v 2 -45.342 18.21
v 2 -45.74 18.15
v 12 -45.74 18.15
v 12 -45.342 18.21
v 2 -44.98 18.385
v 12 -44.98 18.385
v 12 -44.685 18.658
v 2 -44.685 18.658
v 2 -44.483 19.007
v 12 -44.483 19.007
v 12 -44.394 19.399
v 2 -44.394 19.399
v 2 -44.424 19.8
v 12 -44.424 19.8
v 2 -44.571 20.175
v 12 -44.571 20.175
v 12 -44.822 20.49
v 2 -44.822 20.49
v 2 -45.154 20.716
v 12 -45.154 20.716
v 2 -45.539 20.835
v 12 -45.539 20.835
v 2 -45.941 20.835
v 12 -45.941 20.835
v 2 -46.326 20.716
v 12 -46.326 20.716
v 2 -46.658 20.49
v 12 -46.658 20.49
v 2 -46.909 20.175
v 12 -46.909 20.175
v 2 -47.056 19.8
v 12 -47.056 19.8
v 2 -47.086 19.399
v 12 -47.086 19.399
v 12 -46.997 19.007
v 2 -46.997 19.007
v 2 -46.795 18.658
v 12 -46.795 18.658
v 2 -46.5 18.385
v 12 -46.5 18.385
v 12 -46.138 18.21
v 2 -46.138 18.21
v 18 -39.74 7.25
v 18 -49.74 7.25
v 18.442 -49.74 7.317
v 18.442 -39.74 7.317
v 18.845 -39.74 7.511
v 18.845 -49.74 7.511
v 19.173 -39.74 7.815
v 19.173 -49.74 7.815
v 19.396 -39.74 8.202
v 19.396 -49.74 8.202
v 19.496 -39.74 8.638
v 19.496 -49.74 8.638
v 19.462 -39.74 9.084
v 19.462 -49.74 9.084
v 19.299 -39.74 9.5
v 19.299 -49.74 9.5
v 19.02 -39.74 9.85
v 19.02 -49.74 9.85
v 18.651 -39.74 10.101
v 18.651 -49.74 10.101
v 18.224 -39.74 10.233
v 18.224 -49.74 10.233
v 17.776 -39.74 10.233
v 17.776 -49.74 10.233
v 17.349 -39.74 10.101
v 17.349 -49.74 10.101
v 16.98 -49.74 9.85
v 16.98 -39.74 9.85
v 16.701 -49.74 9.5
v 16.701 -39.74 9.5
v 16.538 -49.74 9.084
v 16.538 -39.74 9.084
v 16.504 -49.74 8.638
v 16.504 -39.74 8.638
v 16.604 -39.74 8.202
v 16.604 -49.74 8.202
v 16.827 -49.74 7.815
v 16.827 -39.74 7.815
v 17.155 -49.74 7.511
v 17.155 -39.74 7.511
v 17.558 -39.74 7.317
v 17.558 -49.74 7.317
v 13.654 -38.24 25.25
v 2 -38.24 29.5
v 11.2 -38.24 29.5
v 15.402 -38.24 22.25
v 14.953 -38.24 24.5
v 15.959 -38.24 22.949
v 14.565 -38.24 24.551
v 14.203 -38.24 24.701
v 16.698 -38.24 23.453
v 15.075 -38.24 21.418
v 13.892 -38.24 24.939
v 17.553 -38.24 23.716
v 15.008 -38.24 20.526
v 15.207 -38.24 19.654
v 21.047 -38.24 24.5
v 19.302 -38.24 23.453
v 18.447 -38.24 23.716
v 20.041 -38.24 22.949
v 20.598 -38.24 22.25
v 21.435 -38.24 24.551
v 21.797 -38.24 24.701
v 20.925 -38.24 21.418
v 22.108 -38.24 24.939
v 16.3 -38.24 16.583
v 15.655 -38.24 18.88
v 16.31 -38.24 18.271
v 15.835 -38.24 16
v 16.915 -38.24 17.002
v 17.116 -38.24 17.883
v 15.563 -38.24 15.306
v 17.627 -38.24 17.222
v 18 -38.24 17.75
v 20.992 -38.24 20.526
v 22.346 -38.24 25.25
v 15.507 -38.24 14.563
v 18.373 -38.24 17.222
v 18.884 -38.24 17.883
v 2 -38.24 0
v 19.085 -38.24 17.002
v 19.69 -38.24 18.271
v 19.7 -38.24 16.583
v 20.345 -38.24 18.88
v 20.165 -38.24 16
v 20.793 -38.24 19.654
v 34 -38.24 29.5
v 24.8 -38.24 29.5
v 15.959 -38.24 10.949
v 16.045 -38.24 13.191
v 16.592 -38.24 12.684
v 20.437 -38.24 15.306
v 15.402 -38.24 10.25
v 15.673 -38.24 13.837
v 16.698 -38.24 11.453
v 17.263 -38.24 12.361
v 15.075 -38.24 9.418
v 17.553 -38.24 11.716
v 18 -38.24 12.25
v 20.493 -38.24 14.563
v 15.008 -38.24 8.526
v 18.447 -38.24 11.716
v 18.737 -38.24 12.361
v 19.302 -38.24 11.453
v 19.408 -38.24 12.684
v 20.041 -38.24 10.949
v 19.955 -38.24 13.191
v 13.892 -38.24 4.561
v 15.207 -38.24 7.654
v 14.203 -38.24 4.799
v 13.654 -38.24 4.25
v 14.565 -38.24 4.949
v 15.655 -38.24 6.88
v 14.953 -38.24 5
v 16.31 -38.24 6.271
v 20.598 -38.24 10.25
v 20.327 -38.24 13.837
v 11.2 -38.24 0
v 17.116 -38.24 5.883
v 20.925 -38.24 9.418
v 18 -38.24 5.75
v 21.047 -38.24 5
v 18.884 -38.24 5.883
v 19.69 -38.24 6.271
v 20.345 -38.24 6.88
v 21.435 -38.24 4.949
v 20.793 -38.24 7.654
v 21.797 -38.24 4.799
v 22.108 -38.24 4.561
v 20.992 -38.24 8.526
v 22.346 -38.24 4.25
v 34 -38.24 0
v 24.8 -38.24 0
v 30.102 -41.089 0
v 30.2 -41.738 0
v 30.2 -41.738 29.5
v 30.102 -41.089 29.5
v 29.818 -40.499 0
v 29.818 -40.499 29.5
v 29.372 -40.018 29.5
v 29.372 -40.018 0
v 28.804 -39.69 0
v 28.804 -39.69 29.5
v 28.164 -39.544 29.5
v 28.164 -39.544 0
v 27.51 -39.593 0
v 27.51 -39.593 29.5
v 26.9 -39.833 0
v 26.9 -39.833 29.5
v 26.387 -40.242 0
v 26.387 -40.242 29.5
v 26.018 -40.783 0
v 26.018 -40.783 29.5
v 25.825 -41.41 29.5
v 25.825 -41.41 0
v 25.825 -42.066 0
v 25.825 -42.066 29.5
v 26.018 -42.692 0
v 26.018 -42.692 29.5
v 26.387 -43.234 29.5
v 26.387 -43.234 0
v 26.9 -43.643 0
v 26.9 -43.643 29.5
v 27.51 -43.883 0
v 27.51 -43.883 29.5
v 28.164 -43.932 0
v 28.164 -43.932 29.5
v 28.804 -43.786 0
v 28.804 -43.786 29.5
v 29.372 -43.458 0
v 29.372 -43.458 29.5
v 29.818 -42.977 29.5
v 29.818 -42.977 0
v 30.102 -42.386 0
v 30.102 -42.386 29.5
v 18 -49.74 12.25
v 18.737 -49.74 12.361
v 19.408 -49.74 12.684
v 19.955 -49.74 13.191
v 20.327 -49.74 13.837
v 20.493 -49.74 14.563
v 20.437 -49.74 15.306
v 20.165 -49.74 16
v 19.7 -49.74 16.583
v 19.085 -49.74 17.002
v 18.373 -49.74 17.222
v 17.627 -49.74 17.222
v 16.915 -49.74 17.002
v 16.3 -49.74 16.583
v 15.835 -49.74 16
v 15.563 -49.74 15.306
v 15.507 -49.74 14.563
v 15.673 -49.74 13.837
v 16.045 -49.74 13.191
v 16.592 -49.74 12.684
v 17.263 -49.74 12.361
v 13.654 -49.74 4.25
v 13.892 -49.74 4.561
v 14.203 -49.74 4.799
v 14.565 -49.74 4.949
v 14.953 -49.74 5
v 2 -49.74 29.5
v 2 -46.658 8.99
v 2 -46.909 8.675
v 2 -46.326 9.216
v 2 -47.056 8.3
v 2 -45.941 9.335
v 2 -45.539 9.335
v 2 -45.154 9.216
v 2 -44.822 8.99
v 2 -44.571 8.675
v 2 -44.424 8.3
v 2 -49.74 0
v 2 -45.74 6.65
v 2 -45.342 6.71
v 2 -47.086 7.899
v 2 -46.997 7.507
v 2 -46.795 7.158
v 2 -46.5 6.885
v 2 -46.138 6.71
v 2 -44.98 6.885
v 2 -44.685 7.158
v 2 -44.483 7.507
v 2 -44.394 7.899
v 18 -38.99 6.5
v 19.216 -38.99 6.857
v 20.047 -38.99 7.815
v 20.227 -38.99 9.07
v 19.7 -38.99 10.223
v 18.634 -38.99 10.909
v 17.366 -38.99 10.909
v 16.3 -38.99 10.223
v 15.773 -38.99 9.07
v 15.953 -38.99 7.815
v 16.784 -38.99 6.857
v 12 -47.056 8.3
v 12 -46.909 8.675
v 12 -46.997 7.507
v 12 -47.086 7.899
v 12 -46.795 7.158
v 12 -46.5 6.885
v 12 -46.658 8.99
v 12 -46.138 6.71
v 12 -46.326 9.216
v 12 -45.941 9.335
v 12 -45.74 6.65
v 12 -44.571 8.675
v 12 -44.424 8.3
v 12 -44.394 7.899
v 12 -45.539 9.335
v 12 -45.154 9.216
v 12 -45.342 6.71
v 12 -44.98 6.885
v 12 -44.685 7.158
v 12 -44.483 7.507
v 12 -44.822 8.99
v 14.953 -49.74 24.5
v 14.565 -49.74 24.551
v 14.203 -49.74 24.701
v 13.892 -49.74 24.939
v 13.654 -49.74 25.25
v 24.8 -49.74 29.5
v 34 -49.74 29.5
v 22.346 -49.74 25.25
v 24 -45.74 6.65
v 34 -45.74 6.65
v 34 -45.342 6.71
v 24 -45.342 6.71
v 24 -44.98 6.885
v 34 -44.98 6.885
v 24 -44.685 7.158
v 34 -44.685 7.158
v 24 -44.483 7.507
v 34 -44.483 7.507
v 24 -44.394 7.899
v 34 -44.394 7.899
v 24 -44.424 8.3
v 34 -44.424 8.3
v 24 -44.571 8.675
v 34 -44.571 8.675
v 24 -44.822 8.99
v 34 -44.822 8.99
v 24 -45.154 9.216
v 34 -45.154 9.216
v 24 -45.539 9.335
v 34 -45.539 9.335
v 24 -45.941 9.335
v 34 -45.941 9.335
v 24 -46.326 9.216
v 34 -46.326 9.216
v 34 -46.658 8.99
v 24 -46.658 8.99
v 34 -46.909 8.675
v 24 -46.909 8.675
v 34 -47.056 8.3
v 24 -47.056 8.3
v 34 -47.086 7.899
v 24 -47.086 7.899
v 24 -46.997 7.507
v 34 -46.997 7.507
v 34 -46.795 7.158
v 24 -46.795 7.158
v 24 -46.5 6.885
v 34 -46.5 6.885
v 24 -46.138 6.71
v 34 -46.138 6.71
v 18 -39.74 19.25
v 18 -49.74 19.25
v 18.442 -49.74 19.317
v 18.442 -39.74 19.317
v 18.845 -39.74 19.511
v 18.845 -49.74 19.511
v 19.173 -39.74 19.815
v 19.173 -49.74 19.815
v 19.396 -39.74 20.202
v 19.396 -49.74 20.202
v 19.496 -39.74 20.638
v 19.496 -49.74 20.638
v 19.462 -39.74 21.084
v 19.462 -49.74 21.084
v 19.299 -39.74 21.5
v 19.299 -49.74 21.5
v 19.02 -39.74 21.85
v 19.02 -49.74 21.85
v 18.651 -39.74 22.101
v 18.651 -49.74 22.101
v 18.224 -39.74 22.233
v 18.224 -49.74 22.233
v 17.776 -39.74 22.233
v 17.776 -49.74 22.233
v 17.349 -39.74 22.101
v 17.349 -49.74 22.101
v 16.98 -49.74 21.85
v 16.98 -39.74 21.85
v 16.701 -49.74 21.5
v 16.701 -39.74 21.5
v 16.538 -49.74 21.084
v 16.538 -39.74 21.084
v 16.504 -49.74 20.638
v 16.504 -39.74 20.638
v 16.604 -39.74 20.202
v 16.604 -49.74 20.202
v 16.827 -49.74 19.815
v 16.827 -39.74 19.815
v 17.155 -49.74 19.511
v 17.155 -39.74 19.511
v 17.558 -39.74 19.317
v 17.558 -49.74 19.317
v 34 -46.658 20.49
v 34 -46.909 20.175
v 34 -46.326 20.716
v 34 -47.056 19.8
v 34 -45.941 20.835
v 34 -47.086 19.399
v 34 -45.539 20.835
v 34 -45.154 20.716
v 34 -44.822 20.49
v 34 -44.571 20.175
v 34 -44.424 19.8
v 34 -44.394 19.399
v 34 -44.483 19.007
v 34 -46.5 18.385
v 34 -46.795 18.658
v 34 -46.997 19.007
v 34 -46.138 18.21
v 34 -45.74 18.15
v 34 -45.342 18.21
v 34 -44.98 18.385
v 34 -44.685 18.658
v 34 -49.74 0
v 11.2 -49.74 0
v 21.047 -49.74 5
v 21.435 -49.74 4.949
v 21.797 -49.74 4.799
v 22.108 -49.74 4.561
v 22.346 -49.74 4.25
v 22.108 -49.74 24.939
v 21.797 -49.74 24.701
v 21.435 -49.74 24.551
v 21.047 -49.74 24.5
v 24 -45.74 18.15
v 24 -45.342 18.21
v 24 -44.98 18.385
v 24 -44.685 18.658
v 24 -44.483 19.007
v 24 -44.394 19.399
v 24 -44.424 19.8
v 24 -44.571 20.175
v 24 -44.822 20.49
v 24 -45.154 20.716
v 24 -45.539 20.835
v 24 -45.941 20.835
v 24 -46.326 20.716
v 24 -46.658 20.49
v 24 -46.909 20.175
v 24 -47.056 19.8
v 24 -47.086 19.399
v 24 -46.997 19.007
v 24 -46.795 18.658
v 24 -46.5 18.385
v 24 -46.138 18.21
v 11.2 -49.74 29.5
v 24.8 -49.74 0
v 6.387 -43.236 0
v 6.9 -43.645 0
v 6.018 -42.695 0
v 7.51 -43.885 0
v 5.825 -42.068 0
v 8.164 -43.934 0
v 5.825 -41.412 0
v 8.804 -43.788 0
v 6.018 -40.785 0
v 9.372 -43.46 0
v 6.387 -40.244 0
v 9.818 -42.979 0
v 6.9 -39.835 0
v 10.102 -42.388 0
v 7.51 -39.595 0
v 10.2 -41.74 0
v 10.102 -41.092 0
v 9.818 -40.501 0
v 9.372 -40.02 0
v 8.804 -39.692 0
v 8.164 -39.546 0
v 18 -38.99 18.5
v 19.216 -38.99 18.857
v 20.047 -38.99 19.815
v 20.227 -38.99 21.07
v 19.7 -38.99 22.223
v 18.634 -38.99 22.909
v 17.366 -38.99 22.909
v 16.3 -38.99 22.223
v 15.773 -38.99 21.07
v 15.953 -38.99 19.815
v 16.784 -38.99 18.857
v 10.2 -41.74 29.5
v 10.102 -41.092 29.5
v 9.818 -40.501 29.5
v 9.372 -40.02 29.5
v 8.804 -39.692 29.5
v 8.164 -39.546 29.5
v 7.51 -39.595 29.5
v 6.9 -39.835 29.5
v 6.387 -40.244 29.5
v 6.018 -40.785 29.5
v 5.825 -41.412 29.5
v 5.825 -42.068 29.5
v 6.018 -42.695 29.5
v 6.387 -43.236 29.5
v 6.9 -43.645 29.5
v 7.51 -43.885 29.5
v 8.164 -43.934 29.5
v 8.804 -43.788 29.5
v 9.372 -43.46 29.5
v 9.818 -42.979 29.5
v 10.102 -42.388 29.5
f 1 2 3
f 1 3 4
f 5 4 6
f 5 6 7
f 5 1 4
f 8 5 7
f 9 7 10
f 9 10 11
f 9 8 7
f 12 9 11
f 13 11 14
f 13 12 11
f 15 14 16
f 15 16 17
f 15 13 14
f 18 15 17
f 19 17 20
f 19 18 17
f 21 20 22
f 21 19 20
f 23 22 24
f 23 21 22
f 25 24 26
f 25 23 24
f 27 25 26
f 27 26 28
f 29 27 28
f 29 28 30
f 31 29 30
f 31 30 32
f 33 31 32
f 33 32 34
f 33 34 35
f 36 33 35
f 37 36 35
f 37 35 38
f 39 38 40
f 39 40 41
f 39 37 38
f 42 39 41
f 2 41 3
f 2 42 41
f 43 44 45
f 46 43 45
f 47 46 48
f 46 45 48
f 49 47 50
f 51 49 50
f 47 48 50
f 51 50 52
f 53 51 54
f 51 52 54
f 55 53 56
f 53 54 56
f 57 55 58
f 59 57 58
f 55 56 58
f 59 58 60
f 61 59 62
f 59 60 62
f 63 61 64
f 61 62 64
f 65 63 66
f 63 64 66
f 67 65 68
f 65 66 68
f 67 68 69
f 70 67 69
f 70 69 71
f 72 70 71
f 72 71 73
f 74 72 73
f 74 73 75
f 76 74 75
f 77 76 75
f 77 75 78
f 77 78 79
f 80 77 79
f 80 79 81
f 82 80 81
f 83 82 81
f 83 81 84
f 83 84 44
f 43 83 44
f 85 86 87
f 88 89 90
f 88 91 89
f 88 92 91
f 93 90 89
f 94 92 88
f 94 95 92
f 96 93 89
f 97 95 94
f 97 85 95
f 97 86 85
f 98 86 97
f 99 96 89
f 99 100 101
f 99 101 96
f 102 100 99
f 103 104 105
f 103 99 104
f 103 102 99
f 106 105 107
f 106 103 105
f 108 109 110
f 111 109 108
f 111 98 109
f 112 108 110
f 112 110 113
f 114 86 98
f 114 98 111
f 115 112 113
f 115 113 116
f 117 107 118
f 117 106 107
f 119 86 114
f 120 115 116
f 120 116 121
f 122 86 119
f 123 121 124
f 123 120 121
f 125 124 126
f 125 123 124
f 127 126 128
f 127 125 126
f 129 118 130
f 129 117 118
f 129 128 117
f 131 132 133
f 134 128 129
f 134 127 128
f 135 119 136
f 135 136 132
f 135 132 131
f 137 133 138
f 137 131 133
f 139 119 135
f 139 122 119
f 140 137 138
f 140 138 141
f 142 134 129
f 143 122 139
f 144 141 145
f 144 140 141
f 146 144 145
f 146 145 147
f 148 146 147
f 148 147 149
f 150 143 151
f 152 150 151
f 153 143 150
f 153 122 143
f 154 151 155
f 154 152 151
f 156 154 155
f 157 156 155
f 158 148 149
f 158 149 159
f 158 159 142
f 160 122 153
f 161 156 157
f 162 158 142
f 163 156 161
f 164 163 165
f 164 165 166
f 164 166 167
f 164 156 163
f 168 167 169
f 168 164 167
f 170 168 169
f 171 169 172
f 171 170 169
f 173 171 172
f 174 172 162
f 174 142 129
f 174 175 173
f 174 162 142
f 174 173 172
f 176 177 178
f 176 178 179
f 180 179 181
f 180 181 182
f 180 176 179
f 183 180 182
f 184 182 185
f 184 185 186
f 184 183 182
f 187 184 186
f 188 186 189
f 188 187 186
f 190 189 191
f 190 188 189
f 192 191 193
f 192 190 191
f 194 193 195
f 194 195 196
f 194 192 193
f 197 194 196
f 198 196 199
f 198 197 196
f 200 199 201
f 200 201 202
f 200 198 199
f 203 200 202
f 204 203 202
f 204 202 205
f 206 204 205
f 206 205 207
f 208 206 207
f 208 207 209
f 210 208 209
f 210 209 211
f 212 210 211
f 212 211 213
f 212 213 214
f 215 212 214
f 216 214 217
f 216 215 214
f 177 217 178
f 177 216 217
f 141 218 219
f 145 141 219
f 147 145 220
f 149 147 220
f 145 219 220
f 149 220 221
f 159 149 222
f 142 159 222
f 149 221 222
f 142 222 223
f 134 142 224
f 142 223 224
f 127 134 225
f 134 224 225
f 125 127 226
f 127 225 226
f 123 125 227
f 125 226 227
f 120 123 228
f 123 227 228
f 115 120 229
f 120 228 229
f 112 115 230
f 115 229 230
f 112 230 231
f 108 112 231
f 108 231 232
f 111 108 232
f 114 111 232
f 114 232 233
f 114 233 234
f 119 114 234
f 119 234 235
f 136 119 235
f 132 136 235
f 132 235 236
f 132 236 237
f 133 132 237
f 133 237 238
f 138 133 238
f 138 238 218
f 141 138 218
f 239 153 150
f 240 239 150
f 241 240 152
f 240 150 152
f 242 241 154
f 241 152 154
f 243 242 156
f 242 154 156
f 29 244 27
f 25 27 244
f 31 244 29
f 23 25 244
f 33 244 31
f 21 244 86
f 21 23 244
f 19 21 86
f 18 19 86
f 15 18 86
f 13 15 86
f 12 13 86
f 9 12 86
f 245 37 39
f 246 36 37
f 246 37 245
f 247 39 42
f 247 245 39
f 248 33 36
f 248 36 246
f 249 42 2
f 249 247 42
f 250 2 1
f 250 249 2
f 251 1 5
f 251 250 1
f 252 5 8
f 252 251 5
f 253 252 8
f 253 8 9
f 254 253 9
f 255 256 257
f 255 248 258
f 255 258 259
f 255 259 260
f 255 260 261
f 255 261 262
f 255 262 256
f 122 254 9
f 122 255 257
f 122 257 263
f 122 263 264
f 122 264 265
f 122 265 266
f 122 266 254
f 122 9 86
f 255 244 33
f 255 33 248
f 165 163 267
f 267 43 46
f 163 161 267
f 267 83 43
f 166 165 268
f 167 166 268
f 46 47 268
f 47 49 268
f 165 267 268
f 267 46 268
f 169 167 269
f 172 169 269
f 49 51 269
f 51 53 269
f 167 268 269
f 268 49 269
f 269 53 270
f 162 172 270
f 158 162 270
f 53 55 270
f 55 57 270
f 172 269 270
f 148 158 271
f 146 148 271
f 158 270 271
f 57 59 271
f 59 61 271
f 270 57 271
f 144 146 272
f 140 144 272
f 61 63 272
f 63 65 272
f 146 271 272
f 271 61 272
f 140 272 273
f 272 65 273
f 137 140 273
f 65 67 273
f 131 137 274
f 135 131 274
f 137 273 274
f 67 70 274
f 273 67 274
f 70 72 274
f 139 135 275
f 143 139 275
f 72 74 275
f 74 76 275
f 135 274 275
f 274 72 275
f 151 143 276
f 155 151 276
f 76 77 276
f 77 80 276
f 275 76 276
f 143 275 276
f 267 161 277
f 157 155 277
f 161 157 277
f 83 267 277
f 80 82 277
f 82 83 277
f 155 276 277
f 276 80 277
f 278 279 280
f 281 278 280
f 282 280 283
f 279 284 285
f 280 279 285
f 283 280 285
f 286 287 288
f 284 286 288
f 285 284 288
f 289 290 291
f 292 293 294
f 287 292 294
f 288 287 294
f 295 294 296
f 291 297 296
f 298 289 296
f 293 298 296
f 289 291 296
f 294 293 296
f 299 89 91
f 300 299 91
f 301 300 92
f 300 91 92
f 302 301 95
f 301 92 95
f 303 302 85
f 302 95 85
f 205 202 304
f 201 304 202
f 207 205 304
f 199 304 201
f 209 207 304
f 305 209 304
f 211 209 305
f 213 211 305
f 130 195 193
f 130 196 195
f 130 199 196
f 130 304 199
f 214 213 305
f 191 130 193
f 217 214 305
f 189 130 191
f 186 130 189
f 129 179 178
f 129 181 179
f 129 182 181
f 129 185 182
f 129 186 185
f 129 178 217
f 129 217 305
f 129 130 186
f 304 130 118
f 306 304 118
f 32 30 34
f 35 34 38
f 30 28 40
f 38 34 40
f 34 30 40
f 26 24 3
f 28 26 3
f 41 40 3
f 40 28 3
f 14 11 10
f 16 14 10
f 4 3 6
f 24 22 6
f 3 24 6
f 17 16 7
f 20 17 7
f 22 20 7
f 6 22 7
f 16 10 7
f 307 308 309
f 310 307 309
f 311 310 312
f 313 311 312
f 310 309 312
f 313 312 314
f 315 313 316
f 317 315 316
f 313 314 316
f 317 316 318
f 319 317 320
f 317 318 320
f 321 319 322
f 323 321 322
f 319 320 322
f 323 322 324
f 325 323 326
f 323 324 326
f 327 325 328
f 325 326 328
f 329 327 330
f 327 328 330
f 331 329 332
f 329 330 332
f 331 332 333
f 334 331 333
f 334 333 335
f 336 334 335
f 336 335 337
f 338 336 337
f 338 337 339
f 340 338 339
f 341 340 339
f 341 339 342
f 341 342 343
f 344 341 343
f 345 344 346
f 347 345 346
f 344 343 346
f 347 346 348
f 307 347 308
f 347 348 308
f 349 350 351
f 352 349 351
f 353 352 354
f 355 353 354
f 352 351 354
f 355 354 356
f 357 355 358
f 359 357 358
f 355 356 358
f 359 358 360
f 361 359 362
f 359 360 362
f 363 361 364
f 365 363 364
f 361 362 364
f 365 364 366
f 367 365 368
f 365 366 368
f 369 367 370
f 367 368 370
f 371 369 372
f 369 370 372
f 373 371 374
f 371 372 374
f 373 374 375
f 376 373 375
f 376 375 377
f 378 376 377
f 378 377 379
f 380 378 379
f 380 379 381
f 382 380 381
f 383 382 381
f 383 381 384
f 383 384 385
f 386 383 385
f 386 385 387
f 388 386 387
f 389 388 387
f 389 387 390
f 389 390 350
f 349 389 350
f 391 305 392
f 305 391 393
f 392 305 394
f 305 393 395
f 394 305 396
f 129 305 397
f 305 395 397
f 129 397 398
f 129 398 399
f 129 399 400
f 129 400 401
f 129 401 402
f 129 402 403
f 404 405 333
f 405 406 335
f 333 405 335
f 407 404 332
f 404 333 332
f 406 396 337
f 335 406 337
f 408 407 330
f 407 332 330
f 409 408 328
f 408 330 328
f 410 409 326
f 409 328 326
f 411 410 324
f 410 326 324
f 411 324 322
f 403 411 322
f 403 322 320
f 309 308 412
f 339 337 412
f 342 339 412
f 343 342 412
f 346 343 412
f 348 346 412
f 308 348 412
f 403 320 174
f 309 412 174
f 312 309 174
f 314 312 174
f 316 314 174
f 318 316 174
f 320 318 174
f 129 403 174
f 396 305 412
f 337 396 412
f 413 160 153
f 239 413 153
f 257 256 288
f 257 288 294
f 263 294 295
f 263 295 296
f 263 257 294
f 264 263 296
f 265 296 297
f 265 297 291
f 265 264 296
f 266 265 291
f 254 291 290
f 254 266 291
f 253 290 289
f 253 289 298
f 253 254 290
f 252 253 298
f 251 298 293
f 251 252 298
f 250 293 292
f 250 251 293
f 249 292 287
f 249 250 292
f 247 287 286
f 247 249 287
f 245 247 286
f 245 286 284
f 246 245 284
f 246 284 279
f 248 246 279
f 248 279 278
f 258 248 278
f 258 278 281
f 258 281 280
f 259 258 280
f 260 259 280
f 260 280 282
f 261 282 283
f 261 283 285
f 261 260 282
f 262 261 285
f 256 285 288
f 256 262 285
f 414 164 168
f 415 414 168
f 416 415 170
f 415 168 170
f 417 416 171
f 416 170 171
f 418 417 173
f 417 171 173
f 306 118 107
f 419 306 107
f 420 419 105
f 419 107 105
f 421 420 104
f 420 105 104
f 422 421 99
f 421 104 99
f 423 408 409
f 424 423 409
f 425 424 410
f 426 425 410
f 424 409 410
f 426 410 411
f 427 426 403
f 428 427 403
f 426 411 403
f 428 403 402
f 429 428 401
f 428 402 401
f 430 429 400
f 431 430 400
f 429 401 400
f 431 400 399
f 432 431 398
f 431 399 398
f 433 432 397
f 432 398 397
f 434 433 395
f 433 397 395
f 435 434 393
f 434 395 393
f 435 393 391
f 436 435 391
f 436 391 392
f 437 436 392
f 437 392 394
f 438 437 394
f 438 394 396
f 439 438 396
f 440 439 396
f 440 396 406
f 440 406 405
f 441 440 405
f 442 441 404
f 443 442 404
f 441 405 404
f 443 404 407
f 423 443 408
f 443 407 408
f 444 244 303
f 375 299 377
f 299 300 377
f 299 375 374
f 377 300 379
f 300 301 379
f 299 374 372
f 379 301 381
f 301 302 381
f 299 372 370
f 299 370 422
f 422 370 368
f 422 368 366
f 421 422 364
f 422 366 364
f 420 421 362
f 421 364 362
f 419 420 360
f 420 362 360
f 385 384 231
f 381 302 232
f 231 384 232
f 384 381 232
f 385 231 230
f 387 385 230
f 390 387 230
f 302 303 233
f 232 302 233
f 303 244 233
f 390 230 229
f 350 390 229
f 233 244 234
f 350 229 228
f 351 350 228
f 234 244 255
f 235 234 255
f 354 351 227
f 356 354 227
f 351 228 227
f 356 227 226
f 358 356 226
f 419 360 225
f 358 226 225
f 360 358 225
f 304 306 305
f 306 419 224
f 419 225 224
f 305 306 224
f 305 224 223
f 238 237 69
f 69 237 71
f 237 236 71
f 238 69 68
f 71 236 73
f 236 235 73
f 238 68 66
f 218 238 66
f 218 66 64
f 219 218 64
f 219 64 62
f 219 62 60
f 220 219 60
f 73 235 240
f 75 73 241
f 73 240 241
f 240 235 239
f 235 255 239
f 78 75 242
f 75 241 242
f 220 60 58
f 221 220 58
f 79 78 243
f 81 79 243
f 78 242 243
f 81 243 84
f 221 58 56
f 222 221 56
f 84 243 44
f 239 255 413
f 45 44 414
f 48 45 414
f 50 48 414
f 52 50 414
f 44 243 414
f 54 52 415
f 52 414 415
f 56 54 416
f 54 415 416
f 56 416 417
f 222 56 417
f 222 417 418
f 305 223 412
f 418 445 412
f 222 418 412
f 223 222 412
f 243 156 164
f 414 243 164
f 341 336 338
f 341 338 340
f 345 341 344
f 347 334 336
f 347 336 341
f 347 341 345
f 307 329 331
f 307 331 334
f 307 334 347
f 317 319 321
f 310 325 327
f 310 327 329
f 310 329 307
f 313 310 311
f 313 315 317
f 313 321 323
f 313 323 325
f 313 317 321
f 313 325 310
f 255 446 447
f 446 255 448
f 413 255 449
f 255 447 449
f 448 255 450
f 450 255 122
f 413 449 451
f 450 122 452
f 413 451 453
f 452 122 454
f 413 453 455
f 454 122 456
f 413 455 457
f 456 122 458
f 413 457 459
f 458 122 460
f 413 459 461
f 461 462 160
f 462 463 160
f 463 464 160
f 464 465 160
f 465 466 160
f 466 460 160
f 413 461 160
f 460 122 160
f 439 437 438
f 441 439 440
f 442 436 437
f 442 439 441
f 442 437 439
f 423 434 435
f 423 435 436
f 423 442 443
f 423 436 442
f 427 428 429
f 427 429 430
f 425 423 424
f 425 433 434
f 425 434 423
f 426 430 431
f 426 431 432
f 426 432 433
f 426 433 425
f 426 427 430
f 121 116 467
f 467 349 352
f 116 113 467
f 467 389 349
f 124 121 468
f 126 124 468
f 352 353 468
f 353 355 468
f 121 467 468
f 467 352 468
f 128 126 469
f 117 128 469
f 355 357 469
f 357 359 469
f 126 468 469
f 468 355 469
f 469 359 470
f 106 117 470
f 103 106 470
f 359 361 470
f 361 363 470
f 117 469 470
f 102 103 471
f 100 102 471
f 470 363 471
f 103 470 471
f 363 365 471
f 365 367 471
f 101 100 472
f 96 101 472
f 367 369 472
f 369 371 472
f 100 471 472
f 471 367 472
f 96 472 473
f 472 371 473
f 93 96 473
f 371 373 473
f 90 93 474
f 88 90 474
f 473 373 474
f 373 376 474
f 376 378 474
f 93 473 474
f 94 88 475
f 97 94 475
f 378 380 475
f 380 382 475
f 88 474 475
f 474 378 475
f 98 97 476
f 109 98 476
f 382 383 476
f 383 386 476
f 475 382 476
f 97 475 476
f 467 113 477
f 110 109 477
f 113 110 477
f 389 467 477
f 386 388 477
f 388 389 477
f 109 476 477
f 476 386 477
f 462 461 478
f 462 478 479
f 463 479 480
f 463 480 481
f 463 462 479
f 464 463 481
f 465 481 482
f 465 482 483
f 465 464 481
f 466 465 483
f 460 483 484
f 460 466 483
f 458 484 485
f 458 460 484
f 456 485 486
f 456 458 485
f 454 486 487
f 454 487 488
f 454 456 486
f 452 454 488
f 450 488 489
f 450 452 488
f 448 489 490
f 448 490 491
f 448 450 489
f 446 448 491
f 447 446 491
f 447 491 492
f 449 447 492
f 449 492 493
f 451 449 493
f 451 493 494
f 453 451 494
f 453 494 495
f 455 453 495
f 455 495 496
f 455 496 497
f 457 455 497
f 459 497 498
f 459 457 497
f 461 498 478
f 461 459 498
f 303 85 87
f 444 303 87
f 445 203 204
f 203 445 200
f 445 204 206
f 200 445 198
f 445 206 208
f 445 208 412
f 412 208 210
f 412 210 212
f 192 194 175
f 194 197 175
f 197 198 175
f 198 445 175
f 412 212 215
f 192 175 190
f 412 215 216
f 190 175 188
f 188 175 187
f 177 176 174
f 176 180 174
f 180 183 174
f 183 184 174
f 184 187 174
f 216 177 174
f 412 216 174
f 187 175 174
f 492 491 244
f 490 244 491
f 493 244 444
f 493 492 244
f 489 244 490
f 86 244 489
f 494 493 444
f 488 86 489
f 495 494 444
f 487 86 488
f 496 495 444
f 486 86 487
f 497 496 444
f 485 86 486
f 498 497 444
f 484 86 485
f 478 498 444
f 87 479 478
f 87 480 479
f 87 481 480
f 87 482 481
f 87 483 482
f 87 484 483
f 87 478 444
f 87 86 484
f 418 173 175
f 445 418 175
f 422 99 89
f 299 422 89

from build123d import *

# Parameters (mm, degrees)
SKETCH_1_W          = 31.99999989
SKETCH_1_H          = 11.5
SKETCH_1_R          = 2.2
EXTRUDE_1_DEPTH     = 29.5
SKETCH_2_R          = 2.5
CUT_EXTRUDE_1_DEPTH = 29.5
SKETCH_3_R          = 1.5
CUT_EXTRUDE_2_DEPTH = 29.5
CHAMFER_1_SIZE      = 1.5
SKETCH2_R           = 1.35
CUT_EXTRUDE1_DEPTH  = 10
EXTRUDE1_DEPTH      = 25


with BuildPart() as part:
    # 草图1 → 凸台-拉伸1 (new body)
    with BuildSketch(Plane.XY):
        with Locations((17.999999945, -43.99)):
            Rectangle(SKETCH_1_W, SKETCH_1_H)
        with Locations((8, -41.74)):
            Circle(SKETCH_1_R, mode=Mode.SUBTRACT)
        with Locations((27.99999989, -41.737899898)):
            Circle(SKETCH_1_R, mode=Mode.SUBTRACT)
    extrude(amount=EXTRUDE_1_DEPTH)

    # 草图2 → 切除-拉伸1 (cut)
    with BuildSketch(Plane.XZ.offset(49.74)):
        with Locations(Location((17.999999945, 14.75, 0), (0, 0, 270))):
            Circle(SKETCH_2_R)
    extrude(amount=-CUT_EXTRUDE_1_DEPTH, mode=Mode.SUBTRACT)

    # 草图3 → 切除-拉伸2 (cut)
    with BuildSketch(Plane.XZ.offset(49.74)):
        with Locations(Location((17.999999945, 8.75, 0), (0, 0, 270))):
            Circle(SKETCH_3_R)
        with Locations(Location((17.999999945, 20.75, 0), (0, 0, 270))):
            Circle(SKETCH_3_R)
    extrude(amount=-CUT_EXTRUDE_2_DEPTH, mode=Mode.SUBTRACT)

    # 倒角1
    chamfer_1_edges = [part.edges().sort_by_distance(p)[0] for p in [
        (17.999999945, -38.24, 10.25),
        (17.999999945, -38.24, 22.25),
    ]]
    chamfer(chamfer_1_edges, length=CHAMFER_1_SIZE)

    # Sketch2 → Cut-Extrude1 (cut)
    with BuildSketch(Plane(origin=(33.99999989, 0, 0), x_dir=(0, 0, -1), z_dir=(1, 0, 0))):
        with Locations((-19.5, -45.74)):
            Circle(SKETCH2_R)
        with Locations((-8, -45.74)):
            Circle(SKETCH2_R)
    cut_extrude1 = extrude(amount=-CUT_EXTRUDE1_DEPTH, mode=Mode.SUBTRACT)

    # Mirror1: Cut-Extrude1 across plane
    add(cut_extrude1.mirror(Plane.ZY.offset(-17.999999945)), mode=Mode.SUBTRACT)

    # Sketch3 → Extrude1 (cut)
    with BuildSketch(Plane(origin=(0, -38.24, 0), x_dir=(1, 0, 0), z_dir=(0, 1, 0))):
        with BuildLine():
            Line((11.2, 0), (13.653738644, -4.25))
            ThreePointArc((13.653738644, -4.25), (14.20277675, -4.799038106), (14.95277675, -5))
            Line((14.95277675, -5), (21.04722314, -5))
            ThreePointArc((21.04722314, -5), (21.79722314, -4.799038106), (22.346261246, -4.25))
            Line((22.346261246, -4.25), (24.79999989, 0))
            Line((24.79999989, 0), (11.2, 0))
        make_face()
        with BuildLine():
            Line((11.2, -29.5), (24.79999989, -29.5))
            Line((24.79999989, -29.5), (22.346261246, -25.25))
            ThreePointArc((22.346261246, -25.25), (21.79722314, -24.700961894), (21.04722314, -24.5))
            Line((21.04722314, -24.5), (14.95277675, -24.5))
            ThreePointArc((14.95277675, -24.5), (14.20277675, -24.700961894), (13.653738644, -25.25))
            Line((13.653738644, -25.25), (11.2, -29.5))
        make_face()
    extrude(amount=-EXTRUDE1_DEPTH, mode=Mode.SUBTRACT)


solid = part.part
